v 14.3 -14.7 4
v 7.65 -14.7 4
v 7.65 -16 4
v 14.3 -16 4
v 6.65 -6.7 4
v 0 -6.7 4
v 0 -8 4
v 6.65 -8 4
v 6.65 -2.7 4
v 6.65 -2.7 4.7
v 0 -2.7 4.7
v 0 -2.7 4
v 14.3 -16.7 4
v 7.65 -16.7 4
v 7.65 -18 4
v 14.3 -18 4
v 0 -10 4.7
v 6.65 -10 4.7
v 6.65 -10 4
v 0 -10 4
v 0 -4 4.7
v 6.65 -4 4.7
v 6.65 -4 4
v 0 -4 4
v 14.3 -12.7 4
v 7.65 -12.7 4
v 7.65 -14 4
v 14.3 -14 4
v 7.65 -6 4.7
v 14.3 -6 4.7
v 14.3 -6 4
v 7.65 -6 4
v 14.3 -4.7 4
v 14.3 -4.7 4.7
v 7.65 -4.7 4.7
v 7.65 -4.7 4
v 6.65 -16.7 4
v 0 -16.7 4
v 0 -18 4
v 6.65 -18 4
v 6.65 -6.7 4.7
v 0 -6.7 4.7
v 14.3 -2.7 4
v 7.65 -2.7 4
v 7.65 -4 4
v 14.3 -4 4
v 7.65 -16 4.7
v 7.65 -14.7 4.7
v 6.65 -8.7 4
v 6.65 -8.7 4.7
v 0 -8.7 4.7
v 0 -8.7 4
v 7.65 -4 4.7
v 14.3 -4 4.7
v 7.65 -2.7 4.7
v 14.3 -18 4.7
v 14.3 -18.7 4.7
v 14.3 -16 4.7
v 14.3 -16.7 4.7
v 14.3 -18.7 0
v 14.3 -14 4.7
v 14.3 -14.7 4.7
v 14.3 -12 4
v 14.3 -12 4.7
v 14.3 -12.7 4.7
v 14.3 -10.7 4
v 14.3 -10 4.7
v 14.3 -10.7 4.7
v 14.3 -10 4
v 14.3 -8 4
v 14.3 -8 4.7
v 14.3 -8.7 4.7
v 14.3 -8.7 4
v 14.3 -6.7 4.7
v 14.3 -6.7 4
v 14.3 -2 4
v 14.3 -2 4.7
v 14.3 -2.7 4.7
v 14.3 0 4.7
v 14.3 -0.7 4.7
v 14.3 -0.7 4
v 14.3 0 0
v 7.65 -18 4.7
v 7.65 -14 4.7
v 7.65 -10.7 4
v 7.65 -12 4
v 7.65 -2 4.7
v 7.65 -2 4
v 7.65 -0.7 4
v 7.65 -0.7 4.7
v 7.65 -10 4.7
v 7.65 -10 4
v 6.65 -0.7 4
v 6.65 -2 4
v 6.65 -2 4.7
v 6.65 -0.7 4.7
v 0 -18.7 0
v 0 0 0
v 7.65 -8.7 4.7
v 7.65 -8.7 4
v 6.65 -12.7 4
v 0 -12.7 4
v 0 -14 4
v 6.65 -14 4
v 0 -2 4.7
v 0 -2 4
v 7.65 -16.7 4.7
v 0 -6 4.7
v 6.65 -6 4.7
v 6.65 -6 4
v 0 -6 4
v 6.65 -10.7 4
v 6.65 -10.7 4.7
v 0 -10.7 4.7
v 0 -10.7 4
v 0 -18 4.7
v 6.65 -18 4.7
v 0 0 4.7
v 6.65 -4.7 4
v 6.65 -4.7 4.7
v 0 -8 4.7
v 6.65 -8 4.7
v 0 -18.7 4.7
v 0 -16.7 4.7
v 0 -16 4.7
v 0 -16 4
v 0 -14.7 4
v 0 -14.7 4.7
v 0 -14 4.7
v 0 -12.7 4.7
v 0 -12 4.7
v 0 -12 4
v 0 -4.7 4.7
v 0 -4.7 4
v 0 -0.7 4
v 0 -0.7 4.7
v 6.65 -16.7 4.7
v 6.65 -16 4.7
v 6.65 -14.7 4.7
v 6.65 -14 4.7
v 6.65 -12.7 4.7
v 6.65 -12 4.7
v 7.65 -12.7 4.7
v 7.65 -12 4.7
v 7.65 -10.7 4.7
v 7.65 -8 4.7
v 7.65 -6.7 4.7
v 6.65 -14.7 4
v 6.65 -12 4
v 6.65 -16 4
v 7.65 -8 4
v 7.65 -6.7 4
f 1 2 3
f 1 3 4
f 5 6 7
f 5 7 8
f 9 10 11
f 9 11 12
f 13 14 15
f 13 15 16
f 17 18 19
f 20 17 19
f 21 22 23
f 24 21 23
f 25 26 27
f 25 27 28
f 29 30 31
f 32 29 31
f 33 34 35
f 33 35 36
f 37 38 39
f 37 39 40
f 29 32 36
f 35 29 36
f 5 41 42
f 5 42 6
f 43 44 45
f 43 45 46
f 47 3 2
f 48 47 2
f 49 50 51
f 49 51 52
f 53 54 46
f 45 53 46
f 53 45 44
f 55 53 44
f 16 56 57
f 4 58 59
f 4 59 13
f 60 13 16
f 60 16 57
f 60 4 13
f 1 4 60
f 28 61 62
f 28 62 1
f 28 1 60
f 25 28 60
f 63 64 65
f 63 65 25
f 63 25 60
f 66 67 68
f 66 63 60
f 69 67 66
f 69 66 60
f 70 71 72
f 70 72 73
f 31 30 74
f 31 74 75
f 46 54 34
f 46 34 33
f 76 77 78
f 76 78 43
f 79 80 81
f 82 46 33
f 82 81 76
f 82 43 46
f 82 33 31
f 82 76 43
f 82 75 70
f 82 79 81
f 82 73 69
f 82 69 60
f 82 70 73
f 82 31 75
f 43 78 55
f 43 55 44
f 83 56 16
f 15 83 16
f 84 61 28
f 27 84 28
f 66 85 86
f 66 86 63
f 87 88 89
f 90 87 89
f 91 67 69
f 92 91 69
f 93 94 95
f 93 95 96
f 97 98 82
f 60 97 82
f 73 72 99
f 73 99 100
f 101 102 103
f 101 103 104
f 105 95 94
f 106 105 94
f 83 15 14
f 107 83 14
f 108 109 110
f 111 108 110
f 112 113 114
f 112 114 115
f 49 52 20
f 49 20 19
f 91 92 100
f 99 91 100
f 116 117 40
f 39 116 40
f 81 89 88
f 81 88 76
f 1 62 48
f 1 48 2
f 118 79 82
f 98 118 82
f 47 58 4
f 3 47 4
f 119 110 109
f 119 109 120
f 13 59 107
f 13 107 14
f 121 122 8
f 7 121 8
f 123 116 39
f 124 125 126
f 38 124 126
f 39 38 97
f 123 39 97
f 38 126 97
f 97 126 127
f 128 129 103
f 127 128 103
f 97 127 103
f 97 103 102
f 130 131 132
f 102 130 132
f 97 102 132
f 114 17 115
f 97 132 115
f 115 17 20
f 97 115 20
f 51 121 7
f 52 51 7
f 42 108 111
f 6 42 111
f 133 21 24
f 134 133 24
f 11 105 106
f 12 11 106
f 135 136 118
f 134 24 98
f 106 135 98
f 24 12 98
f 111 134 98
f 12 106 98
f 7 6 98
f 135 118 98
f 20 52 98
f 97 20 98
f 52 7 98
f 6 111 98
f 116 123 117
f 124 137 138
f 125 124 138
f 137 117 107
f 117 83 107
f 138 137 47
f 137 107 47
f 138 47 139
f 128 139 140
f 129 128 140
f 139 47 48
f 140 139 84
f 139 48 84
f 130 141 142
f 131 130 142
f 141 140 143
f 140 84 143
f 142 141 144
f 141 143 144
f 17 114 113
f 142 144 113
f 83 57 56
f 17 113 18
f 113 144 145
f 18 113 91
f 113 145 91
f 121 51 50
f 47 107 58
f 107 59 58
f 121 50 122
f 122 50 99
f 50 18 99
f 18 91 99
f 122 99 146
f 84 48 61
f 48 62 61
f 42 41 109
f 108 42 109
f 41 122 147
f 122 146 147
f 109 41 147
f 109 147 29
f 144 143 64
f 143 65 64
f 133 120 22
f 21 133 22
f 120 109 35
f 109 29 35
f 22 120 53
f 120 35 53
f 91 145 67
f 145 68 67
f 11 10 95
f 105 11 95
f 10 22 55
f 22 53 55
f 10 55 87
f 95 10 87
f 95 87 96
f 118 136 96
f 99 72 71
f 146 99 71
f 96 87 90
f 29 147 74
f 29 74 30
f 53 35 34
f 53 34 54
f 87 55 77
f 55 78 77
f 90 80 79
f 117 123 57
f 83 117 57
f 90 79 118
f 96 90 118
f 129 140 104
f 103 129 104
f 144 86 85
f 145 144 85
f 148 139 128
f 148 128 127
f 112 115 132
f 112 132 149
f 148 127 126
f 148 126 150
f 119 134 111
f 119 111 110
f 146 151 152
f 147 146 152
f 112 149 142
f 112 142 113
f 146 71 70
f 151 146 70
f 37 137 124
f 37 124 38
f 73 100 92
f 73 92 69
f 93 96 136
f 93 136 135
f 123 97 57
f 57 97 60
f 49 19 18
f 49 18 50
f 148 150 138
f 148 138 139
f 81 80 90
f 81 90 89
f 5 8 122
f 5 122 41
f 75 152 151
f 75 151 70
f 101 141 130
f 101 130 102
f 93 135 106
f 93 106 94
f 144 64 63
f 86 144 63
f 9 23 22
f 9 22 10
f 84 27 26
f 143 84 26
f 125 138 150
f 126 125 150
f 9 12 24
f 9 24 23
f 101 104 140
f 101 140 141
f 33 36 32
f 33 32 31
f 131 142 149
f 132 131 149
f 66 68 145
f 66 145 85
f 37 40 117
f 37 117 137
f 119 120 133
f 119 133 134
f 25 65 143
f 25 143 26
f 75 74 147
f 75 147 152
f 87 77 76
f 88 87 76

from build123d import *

# Parameters (mm, degrees)
SKETCH_1_W      = 14.3
SKETCH_1_H      = 18.7
EXTRUDE_1_DEPTH = 4
SKETCH_2_W      = 0.7
SKETCH_2_H      = 0.7
EXTRUDE_2_DEPTH = 14.3
SKETCH_3_W      = 1
SKETCH_3_H      = 18.7
EXTRUDE_4_DEPTH = 0.7


with BuildPart() as part:
    # 草图1 → 凸台-拉伸1 (new body)
    with BuildSketch(Plane.XY):
        with Locations((7.15, -9.35)):
            Rectangle(SKETCH_1_W, SKETCH_1_H)
    extrude(amount=EXTRUDE_1_DEPTH)

    # 草图2 → 凸台-拉伸2 (add)
    with BuildSketch(Plane(origin=(14.3, 0, 0), x_dir=(0, 0, -1), z_dir=(1, 0, 0))):
        with Locations((-4.35, -2.35)):
            Rectangle(SKETCH_2_W, SKETCH_2_H)
        with Locations((-4.35, -0.35)):
            Rectangle(SKETCH_2_W, SKETCH_2_H)
        with Locations((-4.35, -4.35)):
            Rectangle(SKETCH_2_W, SKETCH_2_H)
        with Locations((-4.35, -6.35)):
            Rectangle(SKETCH_2_W, SKETCH_2_H)
        with Locations((-4.35, -8.35)):
            Rectangle(SKETCH_2_W, SKETCH_2_H)
        with Locations((-4.35, -10.35)):
            Rectangle(SKETCH_2_W, SKETCH_2_H)
        with Locations((-4.35, -12.35)):
            Rectangle(SKETCH_2_W, SKETCH_2_H)
        with Locations((-4.35, -14.35)):
            Rectangle(SKETCH_2_W, SKETCH_2_H)
        with Locations((-4.35, -16.35)):
            Rectangle(SKETCH_2_W, SKETCH_2_H)
        with Locations((-4.35, -18.35)):
            Rectangle(SKETCH_2_W, SKETCH_2_H)
    extrude(amount=-EXTRUDE_2_DEPTH)

    # 草图3 → 凸台-拉伸4 (add)
    with BuildSketch(Plane.XY.offset(4)):
        with Locations((7.15, -9.35)):
            Rectangle(SKETCH_3_W, SKETCH_3_H)
    extrude(amount=EXTRUDE_4_DEPTH)


solid = part.part
